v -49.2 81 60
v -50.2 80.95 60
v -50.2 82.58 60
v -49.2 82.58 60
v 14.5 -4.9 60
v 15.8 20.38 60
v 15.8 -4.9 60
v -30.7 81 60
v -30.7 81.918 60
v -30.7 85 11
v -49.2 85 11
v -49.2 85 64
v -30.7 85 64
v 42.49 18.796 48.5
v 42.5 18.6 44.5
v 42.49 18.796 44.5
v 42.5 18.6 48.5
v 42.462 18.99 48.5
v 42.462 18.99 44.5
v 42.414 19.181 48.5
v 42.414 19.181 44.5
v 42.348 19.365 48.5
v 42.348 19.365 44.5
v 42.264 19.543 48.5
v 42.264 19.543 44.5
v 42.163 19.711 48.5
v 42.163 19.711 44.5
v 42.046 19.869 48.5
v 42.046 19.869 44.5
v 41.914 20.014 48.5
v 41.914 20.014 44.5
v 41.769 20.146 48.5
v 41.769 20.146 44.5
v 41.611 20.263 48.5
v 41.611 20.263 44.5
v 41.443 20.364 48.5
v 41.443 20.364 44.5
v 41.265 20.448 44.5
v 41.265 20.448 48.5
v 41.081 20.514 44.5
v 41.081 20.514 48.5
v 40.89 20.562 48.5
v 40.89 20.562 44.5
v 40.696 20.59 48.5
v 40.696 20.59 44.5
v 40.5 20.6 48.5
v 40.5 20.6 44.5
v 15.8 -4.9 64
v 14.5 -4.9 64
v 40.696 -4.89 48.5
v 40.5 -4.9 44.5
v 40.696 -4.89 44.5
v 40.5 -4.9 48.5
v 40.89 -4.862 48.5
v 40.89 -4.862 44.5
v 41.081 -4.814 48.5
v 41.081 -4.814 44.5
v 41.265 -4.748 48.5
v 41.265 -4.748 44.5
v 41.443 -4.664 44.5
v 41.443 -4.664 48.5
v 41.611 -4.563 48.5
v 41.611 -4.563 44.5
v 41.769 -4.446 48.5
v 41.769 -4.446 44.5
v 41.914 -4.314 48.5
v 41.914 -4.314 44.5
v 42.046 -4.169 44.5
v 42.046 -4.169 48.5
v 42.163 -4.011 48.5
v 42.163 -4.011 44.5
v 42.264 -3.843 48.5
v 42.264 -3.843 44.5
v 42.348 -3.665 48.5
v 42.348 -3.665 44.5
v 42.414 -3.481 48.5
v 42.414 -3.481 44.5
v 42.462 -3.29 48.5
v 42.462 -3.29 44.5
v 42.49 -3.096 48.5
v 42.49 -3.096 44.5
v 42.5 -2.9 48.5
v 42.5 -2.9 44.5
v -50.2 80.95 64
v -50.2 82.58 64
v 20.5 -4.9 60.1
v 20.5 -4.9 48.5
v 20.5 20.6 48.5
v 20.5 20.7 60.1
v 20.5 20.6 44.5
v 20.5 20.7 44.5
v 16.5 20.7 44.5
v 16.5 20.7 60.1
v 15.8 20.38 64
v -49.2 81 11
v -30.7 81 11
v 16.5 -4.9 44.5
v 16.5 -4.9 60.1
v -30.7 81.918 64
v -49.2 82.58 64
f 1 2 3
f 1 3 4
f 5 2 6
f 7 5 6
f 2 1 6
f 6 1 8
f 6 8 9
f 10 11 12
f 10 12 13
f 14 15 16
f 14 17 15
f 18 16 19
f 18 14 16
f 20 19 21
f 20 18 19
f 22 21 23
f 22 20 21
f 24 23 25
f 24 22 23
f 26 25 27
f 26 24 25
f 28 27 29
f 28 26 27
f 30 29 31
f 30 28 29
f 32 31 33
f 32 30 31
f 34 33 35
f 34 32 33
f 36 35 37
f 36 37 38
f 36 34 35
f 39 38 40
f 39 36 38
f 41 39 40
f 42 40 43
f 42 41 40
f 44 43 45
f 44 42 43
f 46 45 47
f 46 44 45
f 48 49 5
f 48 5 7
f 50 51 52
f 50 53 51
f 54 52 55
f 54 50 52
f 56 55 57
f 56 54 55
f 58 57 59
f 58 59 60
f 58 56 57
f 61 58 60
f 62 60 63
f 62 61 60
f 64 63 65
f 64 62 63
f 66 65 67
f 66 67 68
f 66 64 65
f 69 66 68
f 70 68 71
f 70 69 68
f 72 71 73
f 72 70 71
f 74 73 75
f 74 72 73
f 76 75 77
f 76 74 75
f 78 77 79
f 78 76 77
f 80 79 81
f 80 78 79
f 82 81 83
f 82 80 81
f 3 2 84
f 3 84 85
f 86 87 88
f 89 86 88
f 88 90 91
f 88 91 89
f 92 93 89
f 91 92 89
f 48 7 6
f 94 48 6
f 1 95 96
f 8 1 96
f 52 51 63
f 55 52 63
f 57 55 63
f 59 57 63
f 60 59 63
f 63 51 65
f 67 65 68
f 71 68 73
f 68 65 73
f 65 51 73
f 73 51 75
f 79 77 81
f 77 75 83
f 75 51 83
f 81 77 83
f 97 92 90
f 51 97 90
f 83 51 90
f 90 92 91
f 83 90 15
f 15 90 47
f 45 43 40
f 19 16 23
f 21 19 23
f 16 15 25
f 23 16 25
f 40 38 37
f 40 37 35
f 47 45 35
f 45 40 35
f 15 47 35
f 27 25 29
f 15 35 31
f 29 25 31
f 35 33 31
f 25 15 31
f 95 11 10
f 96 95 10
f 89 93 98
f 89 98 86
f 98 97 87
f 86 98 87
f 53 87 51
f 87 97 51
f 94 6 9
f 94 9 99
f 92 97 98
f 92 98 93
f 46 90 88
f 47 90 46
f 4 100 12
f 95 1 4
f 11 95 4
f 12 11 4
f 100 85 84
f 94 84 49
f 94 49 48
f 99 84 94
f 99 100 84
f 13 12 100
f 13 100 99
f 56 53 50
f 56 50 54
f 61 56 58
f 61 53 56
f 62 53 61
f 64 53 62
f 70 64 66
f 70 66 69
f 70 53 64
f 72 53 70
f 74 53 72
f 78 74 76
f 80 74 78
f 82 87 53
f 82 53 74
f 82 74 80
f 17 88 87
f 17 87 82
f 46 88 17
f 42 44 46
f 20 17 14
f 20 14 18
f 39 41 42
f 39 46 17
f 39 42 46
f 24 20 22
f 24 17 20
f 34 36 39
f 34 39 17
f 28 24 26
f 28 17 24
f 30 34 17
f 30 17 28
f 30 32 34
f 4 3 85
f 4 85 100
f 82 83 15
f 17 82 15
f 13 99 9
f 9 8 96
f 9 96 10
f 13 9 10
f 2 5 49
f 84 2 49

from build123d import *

# Parameters (mm, degrees)
BOX026_W           = 66
BOX026_H           = 87.48
BOX026_DEPTH       = 4
CHAMFER001_1_SIZE2 = 64.7
CHAMFER001_1_SIZE  = 85.85
CHAMFER001_2_SIZE2 = 47
CHAMFER001_2_SIZE  = 62.2
BOX027_W           = 4
BOX027_H           = 25.6
BOX027_DEPTH       = 15.6
BOX025_W           = 22
BOX025_H           = 25.5
BOX025_DEPTH       = 4
FILLET010_R        = 2
BOX028_W           = 18.5
BOX028_H           = 4
BOX028_DEPTH       = 53


with BuildPart() as chamfer001:
    # Box026 → Box026 (new body)
    with BuildSketch(Plane(origin=(-50.2, -4.9, 60), x_dir=(1, 0, 0), z_dir=(0, 0, 1))):
        with Locations((33, 43.74)):
            Rectangle(BOX026_W, BOX026_H)
    extrude(amount=BOX026_DEPTH)

    # Chamfer001 1
    chamfer001_1_edges = [chamfer001.edges().sort_by_distance(p)[0] for p in [
        (-50.2, -4.9, 62),
    ]]
    chamfer001_1_side = chamfer001.faces().sort_by_distance((-50.2, 38.84, 62))[0]
    chamfer(chamfer001_1_edges, length=CHAMFER001_1_SIZE, length2=CHAMFER001_1_SIZE2, reference=chamfer001_1_side)

    # Chamfer001 2
    chamfer001_2_edges = [chamfer001.edges().sort_by_distance(p)[0] for p in [
        (15.8, 82.58, 62),
    ]]
    chamfer001_2_side = chamfer001.faces().sort_by_distance((15.8, 38.84, 62))[0]
    chamfer(chamfer001_2_edges, length=CHAMFER001_2_SIZE, length2=CHAMFER001_2_SIZE2, reference=chamfer001_2_side)


with BuildPart() as box027:
    # Box027 → Box027 (new body)
    with BuildSketch(Plane(origin=(16.5, -4.9, 44.5), x_dir=(1, 0, 0), z_dir=(0, 0, 1))):
        with Locations((2, 12.8)):
            Rectangle(BOX027_W, BOX027_H)
    extrude(amount=BOX027_DEPTH)


with BuildPart() as fillet010:
    # Box025 → Box025 (new body)
    with BuildSketch(Plane(origin=(20.5, -4.9, 44.5), x_dir=(1, 0, 0), z_dir=(0, 0, 1))):
        with Locations((11, 12.75)):
            Rectangle(BOX025_W, BOX025_H)
    extrude(amount=BOX025_DEPTH)

    # Fillet010
    fillet010_edges = [fillet010.edges().sort_by_distance(p)[0] for p in [
        (42.5, -4.9, 46.5),
        (42.5, 20.6, 46.5),
    ]]
    fillet(fillet010_edges, radius=FILLET010_R)


with BuildPart() as fusion002008006003002:
    # Box028 → Box028 (new body)
    with BuildSketch(Plane(origin=(-49.2, 81, 11), x_dir=(1, 0, 0), z_dir=(0, 0, 1))):
        with Locations((9.25, 2)):
            Rectangle(BOX028_W, BOX028_H)
    extrude(amount=BOX028_DEPTH)

    # Fusion002008006003002: union Chamfer001, Box027, Fillet010
    add(chamfer001.part)
    add(box027.part)
    add(fillet010.part)


solid = fusion002008006003002.part
